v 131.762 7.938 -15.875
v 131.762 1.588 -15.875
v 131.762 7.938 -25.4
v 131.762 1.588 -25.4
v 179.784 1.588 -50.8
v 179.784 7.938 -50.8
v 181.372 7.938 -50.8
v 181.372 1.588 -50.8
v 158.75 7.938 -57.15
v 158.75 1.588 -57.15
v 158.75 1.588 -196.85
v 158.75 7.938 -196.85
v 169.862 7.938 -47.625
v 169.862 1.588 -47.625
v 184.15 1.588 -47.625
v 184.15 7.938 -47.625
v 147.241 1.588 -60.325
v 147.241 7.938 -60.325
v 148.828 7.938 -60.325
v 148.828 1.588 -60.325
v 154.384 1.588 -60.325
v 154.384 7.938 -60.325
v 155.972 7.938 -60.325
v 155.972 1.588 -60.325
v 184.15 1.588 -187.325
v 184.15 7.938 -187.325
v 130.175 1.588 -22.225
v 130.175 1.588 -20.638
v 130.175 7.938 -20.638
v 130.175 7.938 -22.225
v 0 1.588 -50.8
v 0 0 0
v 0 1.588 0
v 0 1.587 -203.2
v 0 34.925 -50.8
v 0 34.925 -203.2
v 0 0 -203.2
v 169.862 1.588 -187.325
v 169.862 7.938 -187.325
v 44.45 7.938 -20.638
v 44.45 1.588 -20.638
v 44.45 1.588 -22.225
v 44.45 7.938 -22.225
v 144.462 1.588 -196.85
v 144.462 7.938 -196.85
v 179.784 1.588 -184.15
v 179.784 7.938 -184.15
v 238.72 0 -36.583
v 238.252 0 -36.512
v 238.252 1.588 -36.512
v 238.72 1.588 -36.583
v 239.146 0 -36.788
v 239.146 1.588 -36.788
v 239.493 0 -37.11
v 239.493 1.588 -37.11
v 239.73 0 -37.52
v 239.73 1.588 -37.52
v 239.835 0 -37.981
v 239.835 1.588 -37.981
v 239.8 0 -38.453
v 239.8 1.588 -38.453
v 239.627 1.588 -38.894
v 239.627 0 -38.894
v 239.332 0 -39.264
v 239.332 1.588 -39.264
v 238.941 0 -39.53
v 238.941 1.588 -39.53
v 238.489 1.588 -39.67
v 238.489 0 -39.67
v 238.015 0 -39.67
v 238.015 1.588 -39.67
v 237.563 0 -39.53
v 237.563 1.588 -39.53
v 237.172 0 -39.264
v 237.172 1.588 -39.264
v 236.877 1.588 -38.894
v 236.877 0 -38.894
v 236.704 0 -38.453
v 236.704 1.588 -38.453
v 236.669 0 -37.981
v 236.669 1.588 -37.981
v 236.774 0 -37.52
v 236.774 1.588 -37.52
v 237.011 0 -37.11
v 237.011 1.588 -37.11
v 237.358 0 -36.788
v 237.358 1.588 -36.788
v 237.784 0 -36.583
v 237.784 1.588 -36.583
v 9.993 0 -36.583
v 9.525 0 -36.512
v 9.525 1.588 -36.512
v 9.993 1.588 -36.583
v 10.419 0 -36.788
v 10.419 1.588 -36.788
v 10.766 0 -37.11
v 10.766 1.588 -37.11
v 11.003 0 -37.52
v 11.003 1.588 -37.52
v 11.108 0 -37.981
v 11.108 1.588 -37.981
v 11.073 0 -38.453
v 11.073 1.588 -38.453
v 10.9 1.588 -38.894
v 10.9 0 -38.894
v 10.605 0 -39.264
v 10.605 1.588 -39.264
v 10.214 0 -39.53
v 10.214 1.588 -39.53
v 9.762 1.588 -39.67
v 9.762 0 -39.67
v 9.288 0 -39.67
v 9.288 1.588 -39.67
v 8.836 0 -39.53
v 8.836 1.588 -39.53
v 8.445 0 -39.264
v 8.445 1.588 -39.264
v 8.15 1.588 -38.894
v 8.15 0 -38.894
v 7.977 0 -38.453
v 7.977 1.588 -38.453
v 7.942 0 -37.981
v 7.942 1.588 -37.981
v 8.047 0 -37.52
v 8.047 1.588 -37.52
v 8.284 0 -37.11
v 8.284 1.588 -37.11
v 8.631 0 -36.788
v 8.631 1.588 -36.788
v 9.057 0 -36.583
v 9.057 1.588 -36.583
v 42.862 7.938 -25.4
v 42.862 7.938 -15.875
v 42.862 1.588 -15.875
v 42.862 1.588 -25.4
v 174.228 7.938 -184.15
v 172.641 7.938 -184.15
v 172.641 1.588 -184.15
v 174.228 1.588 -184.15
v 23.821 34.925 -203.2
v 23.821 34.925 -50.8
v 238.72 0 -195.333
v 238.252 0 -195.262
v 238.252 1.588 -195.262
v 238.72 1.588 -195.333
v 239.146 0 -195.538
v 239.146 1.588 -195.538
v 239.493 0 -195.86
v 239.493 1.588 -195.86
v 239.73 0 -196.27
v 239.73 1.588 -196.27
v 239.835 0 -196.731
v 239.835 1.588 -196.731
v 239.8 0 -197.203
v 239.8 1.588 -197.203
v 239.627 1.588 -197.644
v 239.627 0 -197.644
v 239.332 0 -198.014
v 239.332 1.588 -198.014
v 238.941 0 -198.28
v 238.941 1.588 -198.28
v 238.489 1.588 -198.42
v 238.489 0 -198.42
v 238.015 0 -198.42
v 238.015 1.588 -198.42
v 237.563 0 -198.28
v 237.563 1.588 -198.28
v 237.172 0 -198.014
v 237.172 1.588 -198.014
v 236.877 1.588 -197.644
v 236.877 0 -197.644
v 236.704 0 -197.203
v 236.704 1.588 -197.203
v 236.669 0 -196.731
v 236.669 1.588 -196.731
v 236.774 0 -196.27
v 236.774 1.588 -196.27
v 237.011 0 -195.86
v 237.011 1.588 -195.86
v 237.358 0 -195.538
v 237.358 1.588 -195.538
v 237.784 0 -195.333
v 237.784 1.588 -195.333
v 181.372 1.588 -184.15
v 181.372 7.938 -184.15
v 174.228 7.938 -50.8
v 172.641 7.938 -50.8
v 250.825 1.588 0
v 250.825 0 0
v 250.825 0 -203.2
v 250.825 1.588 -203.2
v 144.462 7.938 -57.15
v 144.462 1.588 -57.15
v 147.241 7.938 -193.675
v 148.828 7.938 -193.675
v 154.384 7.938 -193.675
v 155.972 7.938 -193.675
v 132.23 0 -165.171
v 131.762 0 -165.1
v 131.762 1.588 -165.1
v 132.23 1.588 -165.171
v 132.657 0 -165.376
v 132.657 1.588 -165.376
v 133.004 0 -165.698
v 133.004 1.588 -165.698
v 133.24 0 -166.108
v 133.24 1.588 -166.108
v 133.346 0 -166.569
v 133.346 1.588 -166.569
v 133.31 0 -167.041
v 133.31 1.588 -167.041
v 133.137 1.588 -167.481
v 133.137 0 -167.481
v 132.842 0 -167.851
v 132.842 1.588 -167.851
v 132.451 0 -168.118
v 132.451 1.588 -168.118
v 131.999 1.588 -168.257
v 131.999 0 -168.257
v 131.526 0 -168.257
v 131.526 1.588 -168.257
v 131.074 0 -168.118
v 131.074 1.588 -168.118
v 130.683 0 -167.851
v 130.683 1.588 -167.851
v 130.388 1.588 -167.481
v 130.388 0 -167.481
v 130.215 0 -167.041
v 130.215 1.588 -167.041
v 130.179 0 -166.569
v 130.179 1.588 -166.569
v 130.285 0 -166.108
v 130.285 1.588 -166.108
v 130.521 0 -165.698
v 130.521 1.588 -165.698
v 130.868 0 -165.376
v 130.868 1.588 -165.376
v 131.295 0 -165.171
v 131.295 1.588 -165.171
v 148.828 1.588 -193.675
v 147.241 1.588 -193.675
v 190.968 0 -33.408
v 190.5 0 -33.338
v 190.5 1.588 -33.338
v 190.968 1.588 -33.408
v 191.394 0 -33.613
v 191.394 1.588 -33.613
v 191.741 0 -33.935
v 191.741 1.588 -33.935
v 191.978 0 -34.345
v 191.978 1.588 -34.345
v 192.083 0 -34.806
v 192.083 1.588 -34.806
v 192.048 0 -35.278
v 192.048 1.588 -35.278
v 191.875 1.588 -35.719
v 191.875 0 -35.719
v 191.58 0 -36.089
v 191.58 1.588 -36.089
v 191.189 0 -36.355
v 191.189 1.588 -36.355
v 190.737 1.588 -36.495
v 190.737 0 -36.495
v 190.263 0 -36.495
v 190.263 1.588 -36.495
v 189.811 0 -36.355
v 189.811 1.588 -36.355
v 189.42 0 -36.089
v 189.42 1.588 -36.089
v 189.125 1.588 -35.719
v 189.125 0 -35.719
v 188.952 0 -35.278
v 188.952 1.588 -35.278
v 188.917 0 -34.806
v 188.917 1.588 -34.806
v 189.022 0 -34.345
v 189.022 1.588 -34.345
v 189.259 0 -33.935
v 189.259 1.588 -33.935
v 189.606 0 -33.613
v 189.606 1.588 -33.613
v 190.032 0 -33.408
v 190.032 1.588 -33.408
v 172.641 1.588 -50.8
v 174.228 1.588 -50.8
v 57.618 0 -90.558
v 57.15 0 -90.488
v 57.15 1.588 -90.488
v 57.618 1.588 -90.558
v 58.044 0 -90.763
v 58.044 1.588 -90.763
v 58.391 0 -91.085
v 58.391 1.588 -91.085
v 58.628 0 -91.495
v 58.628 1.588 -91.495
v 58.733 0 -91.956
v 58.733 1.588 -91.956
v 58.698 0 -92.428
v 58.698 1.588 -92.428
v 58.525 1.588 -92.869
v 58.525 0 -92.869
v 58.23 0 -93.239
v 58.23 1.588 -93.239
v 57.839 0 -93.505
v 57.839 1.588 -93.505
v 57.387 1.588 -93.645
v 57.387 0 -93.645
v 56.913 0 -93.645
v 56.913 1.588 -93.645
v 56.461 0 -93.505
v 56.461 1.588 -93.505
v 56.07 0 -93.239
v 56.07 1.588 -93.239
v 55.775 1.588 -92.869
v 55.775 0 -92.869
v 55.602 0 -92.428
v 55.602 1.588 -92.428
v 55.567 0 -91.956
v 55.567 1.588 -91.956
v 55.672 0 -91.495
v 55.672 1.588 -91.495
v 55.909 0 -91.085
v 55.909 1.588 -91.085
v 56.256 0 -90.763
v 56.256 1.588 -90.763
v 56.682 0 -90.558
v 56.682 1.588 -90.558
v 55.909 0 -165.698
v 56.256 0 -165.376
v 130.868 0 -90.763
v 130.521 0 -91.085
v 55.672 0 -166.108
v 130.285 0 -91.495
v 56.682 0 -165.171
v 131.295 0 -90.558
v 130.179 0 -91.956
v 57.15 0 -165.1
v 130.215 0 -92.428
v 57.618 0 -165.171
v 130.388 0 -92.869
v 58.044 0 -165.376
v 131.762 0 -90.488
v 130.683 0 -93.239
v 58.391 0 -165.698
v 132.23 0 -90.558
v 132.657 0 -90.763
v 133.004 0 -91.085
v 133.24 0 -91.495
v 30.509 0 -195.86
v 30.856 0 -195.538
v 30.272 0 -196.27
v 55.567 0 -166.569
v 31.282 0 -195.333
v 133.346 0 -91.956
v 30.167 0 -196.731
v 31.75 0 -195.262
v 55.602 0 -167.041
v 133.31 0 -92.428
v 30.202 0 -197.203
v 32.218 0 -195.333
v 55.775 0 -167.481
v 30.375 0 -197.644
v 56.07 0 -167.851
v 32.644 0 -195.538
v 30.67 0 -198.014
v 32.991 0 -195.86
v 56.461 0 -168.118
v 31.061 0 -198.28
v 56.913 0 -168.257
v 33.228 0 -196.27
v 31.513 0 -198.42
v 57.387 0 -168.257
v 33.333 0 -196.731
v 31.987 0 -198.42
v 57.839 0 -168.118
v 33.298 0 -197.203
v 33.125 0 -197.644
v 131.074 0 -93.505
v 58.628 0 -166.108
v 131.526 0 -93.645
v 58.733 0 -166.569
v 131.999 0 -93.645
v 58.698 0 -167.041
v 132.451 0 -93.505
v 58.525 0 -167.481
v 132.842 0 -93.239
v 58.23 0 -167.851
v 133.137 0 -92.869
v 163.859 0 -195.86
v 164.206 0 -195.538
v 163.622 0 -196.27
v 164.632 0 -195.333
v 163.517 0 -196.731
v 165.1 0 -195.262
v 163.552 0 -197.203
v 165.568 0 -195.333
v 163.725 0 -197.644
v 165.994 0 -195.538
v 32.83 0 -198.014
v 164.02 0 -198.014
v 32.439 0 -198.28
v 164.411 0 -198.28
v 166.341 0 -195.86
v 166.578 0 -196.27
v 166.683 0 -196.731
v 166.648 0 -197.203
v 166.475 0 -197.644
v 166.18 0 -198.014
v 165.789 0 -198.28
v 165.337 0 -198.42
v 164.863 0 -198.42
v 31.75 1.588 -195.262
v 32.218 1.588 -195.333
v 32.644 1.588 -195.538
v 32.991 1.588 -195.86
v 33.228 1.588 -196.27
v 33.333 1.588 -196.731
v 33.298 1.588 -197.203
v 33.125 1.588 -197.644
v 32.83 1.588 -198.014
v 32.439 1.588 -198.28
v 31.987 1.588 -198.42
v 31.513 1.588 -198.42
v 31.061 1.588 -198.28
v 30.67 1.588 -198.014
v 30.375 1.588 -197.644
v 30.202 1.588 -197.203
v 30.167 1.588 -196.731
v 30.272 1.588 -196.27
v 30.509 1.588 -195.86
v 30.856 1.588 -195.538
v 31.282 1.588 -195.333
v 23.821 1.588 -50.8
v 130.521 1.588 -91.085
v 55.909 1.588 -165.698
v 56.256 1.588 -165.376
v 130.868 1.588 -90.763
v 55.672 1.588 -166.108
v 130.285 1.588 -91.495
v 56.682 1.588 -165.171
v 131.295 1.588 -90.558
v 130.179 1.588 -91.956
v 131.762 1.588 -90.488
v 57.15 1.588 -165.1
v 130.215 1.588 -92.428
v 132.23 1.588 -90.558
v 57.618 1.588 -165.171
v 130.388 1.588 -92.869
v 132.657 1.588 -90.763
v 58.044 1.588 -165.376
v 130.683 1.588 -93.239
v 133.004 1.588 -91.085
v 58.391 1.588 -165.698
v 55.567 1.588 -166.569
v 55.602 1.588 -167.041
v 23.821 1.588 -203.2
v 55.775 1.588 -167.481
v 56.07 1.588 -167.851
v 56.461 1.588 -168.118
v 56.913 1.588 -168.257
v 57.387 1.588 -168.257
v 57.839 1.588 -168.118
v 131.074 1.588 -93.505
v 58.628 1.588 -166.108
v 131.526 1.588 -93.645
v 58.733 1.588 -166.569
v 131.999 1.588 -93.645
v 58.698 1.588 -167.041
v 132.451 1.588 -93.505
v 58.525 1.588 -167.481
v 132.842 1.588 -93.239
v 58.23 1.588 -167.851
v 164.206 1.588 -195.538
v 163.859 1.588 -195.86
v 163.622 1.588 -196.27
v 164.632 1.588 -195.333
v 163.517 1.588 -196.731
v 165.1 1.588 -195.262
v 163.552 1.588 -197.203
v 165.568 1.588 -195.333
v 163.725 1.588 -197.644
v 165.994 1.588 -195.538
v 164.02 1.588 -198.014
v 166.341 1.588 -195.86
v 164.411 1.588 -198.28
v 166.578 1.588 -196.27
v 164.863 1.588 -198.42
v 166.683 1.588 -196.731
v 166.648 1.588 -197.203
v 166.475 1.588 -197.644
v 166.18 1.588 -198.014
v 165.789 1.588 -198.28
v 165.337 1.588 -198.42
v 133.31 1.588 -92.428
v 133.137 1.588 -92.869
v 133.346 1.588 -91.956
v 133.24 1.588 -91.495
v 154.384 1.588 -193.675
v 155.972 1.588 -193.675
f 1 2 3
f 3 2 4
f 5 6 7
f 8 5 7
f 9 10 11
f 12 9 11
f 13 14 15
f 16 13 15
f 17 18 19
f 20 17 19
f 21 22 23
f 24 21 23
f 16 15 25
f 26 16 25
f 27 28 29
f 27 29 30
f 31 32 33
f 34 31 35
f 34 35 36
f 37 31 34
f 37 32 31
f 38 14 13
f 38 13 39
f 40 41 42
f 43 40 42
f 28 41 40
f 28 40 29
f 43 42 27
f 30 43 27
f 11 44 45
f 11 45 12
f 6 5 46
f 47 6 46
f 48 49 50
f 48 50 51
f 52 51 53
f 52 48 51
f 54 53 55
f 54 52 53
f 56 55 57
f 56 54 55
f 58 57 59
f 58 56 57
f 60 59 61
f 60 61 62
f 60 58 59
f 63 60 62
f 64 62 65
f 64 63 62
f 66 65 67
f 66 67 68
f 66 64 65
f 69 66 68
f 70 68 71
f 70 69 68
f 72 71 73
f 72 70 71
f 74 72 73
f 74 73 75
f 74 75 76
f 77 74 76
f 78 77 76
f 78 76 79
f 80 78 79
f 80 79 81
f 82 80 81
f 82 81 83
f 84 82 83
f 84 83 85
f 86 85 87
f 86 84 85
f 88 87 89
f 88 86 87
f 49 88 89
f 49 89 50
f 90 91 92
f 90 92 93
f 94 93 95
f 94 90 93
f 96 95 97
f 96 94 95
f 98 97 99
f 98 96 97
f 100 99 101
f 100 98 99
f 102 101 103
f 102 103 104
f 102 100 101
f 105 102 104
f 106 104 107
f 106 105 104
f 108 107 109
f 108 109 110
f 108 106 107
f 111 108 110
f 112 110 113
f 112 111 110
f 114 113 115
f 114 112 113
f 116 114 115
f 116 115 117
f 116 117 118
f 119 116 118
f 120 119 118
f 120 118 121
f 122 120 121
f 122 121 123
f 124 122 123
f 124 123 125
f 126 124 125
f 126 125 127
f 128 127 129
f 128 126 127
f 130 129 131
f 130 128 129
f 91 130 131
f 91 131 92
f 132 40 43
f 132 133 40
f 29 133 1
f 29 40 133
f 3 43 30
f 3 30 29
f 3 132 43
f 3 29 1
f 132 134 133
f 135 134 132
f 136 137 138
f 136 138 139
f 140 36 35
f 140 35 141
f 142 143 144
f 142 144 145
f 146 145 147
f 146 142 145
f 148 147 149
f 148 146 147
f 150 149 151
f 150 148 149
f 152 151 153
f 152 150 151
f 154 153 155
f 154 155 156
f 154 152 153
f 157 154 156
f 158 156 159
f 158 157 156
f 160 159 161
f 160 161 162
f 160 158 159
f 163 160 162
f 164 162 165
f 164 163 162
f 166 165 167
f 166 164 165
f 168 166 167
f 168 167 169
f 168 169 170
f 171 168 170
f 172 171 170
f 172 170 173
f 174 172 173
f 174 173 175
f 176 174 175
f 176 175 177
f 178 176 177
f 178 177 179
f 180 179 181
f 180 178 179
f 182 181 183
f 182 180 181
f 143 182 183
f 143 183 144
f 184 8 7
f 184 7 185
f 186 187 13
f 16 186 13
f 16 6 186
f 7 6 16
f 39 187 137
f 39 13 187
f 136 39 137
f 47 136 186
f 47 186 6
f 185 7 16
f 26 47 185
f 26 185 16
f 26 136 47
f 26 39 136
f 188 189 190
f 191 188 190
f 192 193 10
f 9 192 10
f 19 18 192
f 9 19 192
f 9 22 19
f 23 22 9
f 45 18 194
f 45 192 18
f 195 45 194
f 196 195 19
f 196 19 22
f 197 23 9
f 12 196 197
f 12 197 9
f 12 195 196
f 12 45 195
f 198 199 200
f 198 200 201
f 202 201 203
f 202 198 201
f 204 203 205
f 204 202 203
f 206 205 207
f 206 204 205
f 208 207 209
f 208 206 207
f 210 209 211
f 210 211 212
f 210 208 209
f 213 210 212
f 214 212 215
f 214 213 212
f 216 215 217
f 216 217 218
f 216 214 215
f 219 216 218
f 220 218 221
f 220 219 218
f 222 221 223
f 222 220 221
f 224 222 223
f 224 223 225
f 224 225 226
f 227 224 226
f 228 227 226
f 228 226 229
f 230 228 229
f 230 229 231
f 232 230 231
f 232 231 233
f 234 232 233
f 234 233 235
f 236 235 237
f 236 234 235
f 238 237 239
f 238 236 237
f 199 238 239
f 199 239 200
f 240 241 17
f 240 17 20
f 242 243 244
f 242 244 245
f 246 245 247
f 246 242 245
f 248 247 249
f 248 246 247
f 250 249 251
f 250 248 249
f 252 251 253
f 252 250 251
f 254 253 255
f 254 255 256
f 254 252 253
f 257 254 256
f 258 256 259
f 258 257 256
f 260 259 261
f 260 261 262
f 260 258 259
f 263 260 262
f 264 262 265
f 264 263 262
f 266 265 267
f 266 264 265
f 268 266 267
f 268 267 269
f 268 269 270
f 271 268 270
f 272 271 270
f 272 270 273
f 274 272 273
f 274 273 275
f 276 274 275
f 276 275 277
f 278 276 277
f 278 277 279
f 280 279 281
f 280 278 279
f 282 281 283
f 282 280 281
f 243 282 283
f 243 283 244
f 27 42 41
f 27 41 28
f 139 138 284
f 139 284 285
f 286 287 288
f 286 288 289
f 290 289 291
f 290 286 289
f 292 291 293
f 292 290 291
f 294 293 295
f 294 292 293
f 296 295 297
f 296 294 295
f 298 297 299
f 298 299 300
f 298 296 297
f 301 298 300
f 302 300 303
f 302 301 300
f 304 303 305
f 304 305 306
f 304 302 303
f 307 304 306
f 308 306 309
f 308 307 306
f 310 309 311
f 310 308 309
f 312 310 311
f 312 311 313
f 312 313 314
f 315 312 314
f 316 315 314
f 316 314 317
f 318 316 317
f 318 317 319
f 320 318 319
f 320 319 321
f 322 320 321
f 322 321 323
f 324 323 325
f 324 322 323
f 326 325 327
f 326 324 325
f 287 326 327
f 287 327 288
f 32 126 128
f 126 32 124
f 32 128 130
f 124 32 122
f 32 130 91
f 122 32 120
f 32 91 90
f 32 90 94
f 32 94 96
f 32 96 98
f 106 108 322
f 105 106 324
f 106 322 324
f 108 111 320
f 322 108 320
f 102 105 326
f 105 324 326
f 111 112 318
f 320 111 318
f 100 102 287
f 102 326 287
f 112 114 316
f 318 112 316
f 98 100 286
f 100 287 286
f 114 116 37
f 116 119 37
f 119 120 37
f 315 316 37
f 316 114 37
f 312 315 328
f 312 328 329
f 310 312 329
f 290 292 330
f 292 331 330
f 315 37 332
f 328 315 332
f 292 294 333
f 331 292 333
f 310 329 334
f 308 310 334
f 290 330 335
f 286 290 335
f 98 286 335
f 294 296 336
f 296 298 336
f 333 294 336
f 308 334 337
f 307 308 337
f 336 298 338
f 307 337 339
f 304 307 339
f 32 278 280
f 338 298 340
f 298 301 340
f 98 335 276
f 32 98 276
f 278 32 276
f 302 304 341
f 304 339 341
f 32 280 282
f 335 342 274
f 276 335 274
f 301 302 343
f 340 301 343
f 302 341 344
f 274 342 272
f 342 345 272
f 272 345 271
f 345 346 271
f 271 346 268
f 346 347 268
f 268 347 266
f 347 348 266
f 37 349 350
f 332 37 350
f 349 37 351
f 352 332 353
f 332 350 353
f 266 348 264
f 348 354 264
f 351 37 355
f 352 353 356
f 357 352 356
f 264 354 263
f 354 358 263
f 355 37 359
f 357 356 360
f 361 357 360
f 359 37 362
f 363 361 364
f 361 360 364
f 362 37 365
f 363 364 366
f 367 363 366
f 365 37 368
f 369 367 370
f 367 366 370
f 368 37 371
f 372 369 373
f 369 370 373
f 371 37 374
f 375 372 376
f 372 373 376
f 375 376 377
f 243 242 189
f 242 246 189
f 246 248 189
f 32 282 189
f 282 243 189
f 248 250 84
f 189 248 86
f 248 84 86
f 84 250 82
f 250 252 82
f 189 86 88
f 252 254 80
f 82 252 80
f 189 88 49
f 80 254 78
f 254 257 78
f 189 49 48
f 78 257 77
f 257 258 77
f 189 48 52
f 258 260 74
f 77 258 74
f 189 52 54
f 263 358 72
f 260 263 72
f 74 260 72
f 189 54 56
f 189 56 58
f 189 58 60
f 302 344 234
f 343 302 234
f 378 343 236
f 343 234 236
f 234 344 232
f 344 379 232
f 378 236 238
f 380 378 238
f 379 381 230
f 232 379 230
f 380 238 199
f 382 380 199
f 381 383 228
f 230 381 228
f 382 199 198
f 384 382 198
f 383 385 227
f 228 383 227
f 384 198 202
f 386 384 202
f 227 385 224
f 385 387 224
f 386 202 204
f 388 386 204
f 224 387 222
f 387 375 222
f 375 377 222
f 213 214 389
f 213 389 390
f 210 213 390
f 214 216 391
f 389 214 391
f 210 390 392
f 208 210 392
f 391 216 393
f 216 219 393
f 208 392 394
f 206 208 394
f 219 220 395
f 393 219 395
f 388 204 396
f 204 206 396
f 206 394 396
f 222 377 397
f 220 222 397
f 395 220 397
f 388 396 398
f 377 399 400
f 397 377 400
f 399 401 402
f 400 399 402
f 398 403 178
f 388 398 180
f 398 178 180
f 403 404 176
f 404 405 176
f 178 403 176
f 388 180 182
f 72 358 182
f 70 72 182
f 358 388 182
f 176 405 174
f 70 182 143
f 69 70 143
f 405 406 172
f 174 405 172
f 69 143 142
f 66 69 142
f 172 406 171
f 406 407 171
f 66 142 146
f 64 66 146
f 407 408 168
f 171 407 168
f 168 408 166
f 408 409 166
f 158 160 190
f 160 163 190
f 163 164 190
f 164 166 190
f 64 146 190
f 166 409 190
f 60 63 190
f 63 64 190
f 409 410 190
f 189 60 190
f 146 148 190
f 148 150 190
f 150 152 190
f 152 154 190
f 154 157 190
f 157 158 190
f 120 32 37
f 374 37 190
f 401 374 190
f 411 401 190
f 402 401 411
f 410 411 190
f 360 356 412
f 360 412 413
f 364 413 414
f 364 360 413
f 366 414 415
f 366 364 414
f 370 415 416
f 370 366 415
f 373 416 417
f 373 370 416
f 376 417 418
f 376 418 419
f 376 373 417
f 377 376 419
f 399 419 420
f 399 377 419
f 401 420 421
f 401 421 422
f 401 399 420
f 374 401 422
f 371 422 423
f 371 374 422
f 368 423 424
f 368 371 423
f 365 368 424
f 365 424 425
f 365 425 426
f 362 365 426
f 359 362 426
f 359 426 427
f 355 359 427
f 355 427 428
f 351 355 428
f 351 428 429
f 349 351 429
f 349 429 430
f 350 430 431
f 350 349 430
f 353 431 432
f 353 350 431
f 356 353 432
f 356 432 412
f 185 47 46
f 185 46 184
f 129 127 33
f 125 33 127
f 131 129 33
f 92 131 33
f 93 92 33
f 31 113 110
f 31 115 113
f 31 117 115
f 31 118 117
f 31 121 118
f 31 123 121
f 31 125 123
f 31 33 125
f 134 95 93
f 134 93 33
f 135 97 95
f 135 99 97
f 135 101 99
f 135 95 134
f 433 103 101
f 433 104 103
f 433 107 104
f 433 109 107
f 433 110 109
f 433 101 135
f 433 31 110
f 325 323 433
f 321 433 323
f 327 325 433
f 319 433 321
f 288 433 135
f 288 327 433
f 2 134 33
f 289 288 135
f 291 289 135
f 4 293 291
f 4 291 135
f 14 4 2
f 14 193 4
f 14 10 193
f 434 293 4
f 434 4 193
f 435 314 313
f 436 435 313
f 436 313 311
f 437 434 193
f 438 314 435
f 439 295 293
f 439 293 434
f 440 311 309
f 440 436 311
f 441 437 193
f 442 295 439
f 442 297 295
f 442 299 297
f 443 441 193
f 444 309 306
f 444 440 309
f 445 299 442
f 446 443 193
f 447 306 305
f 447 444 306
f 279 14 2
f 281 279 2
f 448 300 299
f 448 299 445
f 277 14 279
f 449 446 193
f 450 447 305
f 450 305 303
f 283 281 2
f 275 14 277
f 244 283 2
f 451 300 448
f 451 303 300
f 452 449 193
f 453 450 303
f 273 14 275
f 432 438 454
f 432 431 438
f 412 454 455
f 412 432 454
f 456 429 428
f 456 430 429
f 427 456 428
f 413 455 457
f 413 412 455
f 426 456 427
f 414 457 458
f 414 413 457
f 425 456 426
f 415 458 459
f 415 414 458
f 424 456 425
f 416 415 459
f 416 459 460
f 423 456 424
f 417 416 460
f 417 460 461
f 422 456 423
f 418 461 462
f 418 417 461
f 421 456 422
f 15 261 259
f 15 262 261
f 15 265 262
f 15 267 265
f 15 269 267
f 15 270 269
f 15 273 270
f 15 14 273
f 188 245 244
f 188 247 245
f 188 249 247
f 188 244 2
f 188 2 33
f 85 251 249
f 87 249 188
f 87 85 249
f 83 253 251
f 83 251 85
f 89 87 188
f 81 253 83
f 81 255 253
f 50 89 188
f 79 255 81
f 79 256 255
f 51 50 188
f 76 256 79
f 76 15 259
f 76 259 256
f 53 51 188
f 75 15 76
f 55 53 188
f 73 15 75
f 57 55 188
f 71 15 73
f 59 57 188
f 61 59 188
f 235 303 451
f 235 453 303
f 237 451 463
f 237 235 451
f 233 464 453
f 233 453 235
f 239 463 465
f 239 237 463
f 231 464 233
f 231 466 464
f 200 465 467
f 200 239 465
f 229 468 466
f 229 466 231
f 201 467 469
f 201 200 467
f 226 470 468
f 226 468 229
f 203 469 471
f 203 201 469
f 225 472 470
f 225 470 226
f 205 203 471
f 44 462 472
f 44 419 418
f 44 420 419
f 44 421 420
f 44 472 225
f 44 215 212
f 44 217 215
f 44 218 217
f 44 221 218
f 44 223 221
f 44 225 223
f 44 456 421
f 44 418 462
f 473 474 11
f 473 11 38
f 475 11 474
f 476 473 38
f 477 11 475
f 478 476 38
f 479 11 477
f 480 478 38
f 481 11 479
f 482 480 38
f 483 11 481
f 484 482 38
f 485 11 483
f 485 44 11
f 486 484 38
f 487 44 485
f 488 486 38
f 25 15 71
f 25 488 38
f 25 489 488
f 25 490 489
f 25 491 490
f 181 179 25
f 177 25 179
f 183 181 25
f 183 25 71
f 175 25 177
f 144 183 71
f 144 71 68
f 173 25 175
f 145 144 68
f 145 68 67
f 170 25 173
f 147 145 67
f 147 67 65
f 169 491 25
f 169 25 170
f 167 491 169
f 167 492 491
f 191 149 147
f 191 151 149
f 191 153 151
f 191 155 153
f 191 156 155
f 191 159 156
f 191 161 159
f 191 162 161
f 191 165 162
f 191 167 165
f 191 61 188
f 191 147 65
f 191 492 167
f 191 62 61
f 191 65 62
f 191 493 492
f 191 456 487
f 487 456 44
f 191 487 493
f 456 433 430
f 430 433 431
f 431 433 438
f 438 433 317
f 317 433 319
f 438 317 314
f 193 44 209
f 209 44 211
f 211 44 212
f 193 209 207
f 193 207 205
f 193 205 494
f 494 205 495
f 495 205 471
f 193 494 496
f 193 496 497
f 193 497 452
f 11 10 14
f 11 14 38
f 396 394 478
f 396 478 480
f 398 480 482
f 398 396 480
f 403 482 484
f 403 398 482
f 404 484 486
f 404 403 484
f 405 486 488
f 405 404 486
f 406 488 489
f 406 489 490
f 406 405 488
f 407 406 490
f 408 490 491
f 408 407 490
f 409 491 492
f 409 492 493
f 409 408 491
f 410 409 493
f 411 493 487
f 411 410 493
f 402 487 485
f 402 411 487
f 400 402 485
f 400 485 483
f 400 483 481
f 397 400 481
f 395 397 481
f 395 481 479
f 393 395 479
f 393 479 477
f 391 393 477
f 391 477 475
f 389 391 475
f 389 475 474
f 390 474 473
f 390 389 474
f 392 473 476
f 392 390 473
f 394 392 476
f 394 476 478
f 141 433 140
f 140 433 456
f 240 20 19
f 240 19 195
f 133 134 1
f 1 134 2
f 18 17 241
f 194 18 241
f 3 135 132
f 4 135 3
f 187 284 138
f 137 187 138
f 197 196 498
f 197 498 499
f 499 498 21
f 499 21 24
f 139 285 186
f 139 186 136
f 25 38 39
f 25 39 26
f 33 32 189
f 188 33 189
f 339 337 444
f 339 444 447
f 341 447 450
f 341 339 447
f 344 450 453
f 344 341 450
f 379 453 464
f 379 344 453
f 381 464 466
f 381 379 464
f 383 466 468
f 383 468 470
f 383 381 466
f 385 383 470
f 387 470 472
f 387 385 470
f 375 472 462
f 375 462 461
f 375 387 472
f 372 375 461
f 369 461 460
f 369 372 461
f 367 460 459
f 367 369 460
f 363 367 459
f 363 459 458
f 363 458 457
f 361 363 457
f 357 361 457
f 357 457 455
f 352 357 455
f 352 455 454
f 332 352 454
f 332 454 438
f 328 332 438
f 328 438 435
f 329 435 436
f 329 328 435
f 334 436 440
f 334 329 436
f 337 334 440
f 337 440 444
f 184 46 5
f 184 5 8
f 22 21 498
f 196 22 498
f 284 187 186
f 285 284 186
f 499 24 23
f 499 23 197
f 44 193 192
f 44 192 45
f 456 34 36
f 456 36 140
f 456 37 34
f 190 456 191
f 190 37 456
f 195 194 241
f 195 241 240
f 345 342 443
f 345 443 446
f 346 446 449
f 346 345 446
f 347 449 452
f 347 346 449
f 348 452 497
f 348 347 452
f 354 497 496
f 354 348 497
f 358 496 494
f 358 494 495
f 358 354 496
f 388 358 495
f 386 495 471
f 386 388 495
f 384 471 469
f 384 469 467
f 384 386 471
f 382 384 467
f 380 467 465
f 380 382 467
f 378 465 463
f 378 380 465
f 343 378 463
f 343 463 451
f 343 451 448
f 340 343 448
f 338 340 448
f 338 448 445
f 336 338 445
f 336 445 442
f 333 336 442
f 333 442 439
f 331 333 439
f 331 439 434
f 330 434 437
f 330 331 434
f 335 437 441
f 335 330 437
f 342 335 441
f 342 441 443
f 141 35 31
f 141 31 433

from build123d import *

# Parameters (mm, degrees)
SKETCH1_W           = 250.825
SKETCH1_H           = 203.2
SKETCH1_R           = 1.5875
BOSS_EXTRUDE1_DEPTH = 1.5875
SKETCH2_W           = 14.2875
SKETCH2_H           = 139.7
SKETCH2_W_2         = 1.5875
SKETCH2_H_2         = 133.35
SKETCH2_W_3         = 88.9
SKETCH2_H_3         = 9.525
SKETCH2_W_4         = 85.725
SKETCH2_H_4         = 1.5875
BOSS_EXTRUDE2_DEPTH = 6.35
SKETCH3_W           = 23.821163823
SKETCH3_H           = 152.4
BOSS_EXTRUDE3_DEPTH = 33.3375


with BuildPart() as part:
    # Sketch1 → Boss-Extrude1 (new body)
    with BuildSketch(Plane(origin=(0, 0, 0), x_dir=(1, 0, 0), z_dir=(0, 1, 0))):
        with Locations((125.4125, 101.6)):
            Rectangle(SKETCH1_W, SKETCH1_H)
        with Locations(Location((31.75, 196.85, 0), (0, 0, 270))):
            Circle(SKETCH1_R, mode=Mode.SUBTRACT)
        with Locations(Location((165.1, 196.85, 0), (0, 0, 270))):
            Circle(SKETCH1_R, mode=Mode.SUBTRACT)
        with Locations(Location((238.252, 196.85, 0), (0, 0, 270))):
            Circle(SKETCH1_R, mode=Mode.SUBTRACT)
        with Locations(Location((238.252, 38.1, 0), (0, 0, 270))):
            Circle(SKETCH1_R, mode=Mode.SUBTRACT)
        with Locations(Location((190.5, 34.925, 0), (0, 0, 270))):
            Circle(SKETCH1_R, mode=Mode.SUBTRACT)
        with Locations(Location((9.525, 38.1, 0), (0, 0, 270))):
            Circle(SKETCH1_R, mode=Mode.SUBTRACT)
        with Locations(Location((57.15, 166.6875, 0), (0, 0, 270))):
            Circle(SKETCH1_R, mode=Mode.SUBTRACT)
        with Locations(Location((131.7625, 166.6875, 0), (0, 0, 270))):
            Circle(SKETCH1_R, mode=Mode.SUBTRACT)
        with Locations(Location((131.7625, 92.075, 0), (0, 0, 270))):
            Circle(SKETCH1_R, mode=Mode.SUBTRACT)
        with Locations(Location((57.15, 92.075, 0), (0, 0, 270))):
            Circle(SKETCH1_R, mode=Mode.SUBTRACT)
    extrude(amount=BOSS_EXTRUDE1_DEPTH)

    # Sketch2 → Boss-Extrude2 (add)
    # profile 1 of 3: a face of its own
    with BuildSketch(Plane(origin=(0, 1.5875, 0), x_dir=(1, 0, 0), z_dir=(0, 1, 0))):
        with Locations((151.60625, 127)):
            Rectangle(SKETCH2_W, SKETCH2_H)
        with Locations((148.034375, 127)):
            Rectangle(SKETCH2_W_2, SKETCH2_H_2, mode=Mode.SUBTRACT)
        with Locations((155.178125, 127)):
            Rectangle(SKETCH2_W_2, SKETCH2_H_2, mode=Mode.SUBTRACT)
    # profile 2 of 3: a face of its own
    with BuildSketch(Plane(origin=(0, 1.5875, 0), x_dir=(1, 0, 0), z_dir=(0, 1, 0))):
        with Locations((177.00625, 117.475)):
            Rectangle(SKETCH2_W, SKETCH2_H)
        with Locations((173.434375, 117.475)):
            Rectangle(SKETCH2_W_2, SKETCH2_H_2, mode=Mode.SUBTRACT)
        with Locations((180.578125, 117.475)):
            Rectangle(SKETCH2_W_2, SKETCH2_H_2, mode=Mode.SUBTRACT)
    # profile 3 of 3: a face of its own
    with BuildSketch(Plane(origin=(0, 1.5875, 0), x_dir=(1, 0, 0), z_dir=(0, 1, 0))):
        with Locations((87.3125, 20.6375)):
            Rectangle(SKETCH2_W_3, SKETCH2_H_3)
        with Locations((87.3125, 21.43125)):
            Rectangle(SKETCH2_W_4, SKETCH2_H_4, mode=Mode.SUBTRACT)
    extrude(amount=BOSS_EXTRUDE2_DEPTH)

    # Sketch3 → Boss-Extrude3 (add)
    with BuildSketch(Plane(origin=(0, 1.5875, 0), x_dir=(1, 0, 0), z_dir=(0, 1, 0))):
        with Locations((11.910581912, 127)):
            Rectangle(SKETCH3_W, SKETCH3_H)
    extrude(amount=BOSS_EXTRUDE3_DEPTH)


solid = part.part
